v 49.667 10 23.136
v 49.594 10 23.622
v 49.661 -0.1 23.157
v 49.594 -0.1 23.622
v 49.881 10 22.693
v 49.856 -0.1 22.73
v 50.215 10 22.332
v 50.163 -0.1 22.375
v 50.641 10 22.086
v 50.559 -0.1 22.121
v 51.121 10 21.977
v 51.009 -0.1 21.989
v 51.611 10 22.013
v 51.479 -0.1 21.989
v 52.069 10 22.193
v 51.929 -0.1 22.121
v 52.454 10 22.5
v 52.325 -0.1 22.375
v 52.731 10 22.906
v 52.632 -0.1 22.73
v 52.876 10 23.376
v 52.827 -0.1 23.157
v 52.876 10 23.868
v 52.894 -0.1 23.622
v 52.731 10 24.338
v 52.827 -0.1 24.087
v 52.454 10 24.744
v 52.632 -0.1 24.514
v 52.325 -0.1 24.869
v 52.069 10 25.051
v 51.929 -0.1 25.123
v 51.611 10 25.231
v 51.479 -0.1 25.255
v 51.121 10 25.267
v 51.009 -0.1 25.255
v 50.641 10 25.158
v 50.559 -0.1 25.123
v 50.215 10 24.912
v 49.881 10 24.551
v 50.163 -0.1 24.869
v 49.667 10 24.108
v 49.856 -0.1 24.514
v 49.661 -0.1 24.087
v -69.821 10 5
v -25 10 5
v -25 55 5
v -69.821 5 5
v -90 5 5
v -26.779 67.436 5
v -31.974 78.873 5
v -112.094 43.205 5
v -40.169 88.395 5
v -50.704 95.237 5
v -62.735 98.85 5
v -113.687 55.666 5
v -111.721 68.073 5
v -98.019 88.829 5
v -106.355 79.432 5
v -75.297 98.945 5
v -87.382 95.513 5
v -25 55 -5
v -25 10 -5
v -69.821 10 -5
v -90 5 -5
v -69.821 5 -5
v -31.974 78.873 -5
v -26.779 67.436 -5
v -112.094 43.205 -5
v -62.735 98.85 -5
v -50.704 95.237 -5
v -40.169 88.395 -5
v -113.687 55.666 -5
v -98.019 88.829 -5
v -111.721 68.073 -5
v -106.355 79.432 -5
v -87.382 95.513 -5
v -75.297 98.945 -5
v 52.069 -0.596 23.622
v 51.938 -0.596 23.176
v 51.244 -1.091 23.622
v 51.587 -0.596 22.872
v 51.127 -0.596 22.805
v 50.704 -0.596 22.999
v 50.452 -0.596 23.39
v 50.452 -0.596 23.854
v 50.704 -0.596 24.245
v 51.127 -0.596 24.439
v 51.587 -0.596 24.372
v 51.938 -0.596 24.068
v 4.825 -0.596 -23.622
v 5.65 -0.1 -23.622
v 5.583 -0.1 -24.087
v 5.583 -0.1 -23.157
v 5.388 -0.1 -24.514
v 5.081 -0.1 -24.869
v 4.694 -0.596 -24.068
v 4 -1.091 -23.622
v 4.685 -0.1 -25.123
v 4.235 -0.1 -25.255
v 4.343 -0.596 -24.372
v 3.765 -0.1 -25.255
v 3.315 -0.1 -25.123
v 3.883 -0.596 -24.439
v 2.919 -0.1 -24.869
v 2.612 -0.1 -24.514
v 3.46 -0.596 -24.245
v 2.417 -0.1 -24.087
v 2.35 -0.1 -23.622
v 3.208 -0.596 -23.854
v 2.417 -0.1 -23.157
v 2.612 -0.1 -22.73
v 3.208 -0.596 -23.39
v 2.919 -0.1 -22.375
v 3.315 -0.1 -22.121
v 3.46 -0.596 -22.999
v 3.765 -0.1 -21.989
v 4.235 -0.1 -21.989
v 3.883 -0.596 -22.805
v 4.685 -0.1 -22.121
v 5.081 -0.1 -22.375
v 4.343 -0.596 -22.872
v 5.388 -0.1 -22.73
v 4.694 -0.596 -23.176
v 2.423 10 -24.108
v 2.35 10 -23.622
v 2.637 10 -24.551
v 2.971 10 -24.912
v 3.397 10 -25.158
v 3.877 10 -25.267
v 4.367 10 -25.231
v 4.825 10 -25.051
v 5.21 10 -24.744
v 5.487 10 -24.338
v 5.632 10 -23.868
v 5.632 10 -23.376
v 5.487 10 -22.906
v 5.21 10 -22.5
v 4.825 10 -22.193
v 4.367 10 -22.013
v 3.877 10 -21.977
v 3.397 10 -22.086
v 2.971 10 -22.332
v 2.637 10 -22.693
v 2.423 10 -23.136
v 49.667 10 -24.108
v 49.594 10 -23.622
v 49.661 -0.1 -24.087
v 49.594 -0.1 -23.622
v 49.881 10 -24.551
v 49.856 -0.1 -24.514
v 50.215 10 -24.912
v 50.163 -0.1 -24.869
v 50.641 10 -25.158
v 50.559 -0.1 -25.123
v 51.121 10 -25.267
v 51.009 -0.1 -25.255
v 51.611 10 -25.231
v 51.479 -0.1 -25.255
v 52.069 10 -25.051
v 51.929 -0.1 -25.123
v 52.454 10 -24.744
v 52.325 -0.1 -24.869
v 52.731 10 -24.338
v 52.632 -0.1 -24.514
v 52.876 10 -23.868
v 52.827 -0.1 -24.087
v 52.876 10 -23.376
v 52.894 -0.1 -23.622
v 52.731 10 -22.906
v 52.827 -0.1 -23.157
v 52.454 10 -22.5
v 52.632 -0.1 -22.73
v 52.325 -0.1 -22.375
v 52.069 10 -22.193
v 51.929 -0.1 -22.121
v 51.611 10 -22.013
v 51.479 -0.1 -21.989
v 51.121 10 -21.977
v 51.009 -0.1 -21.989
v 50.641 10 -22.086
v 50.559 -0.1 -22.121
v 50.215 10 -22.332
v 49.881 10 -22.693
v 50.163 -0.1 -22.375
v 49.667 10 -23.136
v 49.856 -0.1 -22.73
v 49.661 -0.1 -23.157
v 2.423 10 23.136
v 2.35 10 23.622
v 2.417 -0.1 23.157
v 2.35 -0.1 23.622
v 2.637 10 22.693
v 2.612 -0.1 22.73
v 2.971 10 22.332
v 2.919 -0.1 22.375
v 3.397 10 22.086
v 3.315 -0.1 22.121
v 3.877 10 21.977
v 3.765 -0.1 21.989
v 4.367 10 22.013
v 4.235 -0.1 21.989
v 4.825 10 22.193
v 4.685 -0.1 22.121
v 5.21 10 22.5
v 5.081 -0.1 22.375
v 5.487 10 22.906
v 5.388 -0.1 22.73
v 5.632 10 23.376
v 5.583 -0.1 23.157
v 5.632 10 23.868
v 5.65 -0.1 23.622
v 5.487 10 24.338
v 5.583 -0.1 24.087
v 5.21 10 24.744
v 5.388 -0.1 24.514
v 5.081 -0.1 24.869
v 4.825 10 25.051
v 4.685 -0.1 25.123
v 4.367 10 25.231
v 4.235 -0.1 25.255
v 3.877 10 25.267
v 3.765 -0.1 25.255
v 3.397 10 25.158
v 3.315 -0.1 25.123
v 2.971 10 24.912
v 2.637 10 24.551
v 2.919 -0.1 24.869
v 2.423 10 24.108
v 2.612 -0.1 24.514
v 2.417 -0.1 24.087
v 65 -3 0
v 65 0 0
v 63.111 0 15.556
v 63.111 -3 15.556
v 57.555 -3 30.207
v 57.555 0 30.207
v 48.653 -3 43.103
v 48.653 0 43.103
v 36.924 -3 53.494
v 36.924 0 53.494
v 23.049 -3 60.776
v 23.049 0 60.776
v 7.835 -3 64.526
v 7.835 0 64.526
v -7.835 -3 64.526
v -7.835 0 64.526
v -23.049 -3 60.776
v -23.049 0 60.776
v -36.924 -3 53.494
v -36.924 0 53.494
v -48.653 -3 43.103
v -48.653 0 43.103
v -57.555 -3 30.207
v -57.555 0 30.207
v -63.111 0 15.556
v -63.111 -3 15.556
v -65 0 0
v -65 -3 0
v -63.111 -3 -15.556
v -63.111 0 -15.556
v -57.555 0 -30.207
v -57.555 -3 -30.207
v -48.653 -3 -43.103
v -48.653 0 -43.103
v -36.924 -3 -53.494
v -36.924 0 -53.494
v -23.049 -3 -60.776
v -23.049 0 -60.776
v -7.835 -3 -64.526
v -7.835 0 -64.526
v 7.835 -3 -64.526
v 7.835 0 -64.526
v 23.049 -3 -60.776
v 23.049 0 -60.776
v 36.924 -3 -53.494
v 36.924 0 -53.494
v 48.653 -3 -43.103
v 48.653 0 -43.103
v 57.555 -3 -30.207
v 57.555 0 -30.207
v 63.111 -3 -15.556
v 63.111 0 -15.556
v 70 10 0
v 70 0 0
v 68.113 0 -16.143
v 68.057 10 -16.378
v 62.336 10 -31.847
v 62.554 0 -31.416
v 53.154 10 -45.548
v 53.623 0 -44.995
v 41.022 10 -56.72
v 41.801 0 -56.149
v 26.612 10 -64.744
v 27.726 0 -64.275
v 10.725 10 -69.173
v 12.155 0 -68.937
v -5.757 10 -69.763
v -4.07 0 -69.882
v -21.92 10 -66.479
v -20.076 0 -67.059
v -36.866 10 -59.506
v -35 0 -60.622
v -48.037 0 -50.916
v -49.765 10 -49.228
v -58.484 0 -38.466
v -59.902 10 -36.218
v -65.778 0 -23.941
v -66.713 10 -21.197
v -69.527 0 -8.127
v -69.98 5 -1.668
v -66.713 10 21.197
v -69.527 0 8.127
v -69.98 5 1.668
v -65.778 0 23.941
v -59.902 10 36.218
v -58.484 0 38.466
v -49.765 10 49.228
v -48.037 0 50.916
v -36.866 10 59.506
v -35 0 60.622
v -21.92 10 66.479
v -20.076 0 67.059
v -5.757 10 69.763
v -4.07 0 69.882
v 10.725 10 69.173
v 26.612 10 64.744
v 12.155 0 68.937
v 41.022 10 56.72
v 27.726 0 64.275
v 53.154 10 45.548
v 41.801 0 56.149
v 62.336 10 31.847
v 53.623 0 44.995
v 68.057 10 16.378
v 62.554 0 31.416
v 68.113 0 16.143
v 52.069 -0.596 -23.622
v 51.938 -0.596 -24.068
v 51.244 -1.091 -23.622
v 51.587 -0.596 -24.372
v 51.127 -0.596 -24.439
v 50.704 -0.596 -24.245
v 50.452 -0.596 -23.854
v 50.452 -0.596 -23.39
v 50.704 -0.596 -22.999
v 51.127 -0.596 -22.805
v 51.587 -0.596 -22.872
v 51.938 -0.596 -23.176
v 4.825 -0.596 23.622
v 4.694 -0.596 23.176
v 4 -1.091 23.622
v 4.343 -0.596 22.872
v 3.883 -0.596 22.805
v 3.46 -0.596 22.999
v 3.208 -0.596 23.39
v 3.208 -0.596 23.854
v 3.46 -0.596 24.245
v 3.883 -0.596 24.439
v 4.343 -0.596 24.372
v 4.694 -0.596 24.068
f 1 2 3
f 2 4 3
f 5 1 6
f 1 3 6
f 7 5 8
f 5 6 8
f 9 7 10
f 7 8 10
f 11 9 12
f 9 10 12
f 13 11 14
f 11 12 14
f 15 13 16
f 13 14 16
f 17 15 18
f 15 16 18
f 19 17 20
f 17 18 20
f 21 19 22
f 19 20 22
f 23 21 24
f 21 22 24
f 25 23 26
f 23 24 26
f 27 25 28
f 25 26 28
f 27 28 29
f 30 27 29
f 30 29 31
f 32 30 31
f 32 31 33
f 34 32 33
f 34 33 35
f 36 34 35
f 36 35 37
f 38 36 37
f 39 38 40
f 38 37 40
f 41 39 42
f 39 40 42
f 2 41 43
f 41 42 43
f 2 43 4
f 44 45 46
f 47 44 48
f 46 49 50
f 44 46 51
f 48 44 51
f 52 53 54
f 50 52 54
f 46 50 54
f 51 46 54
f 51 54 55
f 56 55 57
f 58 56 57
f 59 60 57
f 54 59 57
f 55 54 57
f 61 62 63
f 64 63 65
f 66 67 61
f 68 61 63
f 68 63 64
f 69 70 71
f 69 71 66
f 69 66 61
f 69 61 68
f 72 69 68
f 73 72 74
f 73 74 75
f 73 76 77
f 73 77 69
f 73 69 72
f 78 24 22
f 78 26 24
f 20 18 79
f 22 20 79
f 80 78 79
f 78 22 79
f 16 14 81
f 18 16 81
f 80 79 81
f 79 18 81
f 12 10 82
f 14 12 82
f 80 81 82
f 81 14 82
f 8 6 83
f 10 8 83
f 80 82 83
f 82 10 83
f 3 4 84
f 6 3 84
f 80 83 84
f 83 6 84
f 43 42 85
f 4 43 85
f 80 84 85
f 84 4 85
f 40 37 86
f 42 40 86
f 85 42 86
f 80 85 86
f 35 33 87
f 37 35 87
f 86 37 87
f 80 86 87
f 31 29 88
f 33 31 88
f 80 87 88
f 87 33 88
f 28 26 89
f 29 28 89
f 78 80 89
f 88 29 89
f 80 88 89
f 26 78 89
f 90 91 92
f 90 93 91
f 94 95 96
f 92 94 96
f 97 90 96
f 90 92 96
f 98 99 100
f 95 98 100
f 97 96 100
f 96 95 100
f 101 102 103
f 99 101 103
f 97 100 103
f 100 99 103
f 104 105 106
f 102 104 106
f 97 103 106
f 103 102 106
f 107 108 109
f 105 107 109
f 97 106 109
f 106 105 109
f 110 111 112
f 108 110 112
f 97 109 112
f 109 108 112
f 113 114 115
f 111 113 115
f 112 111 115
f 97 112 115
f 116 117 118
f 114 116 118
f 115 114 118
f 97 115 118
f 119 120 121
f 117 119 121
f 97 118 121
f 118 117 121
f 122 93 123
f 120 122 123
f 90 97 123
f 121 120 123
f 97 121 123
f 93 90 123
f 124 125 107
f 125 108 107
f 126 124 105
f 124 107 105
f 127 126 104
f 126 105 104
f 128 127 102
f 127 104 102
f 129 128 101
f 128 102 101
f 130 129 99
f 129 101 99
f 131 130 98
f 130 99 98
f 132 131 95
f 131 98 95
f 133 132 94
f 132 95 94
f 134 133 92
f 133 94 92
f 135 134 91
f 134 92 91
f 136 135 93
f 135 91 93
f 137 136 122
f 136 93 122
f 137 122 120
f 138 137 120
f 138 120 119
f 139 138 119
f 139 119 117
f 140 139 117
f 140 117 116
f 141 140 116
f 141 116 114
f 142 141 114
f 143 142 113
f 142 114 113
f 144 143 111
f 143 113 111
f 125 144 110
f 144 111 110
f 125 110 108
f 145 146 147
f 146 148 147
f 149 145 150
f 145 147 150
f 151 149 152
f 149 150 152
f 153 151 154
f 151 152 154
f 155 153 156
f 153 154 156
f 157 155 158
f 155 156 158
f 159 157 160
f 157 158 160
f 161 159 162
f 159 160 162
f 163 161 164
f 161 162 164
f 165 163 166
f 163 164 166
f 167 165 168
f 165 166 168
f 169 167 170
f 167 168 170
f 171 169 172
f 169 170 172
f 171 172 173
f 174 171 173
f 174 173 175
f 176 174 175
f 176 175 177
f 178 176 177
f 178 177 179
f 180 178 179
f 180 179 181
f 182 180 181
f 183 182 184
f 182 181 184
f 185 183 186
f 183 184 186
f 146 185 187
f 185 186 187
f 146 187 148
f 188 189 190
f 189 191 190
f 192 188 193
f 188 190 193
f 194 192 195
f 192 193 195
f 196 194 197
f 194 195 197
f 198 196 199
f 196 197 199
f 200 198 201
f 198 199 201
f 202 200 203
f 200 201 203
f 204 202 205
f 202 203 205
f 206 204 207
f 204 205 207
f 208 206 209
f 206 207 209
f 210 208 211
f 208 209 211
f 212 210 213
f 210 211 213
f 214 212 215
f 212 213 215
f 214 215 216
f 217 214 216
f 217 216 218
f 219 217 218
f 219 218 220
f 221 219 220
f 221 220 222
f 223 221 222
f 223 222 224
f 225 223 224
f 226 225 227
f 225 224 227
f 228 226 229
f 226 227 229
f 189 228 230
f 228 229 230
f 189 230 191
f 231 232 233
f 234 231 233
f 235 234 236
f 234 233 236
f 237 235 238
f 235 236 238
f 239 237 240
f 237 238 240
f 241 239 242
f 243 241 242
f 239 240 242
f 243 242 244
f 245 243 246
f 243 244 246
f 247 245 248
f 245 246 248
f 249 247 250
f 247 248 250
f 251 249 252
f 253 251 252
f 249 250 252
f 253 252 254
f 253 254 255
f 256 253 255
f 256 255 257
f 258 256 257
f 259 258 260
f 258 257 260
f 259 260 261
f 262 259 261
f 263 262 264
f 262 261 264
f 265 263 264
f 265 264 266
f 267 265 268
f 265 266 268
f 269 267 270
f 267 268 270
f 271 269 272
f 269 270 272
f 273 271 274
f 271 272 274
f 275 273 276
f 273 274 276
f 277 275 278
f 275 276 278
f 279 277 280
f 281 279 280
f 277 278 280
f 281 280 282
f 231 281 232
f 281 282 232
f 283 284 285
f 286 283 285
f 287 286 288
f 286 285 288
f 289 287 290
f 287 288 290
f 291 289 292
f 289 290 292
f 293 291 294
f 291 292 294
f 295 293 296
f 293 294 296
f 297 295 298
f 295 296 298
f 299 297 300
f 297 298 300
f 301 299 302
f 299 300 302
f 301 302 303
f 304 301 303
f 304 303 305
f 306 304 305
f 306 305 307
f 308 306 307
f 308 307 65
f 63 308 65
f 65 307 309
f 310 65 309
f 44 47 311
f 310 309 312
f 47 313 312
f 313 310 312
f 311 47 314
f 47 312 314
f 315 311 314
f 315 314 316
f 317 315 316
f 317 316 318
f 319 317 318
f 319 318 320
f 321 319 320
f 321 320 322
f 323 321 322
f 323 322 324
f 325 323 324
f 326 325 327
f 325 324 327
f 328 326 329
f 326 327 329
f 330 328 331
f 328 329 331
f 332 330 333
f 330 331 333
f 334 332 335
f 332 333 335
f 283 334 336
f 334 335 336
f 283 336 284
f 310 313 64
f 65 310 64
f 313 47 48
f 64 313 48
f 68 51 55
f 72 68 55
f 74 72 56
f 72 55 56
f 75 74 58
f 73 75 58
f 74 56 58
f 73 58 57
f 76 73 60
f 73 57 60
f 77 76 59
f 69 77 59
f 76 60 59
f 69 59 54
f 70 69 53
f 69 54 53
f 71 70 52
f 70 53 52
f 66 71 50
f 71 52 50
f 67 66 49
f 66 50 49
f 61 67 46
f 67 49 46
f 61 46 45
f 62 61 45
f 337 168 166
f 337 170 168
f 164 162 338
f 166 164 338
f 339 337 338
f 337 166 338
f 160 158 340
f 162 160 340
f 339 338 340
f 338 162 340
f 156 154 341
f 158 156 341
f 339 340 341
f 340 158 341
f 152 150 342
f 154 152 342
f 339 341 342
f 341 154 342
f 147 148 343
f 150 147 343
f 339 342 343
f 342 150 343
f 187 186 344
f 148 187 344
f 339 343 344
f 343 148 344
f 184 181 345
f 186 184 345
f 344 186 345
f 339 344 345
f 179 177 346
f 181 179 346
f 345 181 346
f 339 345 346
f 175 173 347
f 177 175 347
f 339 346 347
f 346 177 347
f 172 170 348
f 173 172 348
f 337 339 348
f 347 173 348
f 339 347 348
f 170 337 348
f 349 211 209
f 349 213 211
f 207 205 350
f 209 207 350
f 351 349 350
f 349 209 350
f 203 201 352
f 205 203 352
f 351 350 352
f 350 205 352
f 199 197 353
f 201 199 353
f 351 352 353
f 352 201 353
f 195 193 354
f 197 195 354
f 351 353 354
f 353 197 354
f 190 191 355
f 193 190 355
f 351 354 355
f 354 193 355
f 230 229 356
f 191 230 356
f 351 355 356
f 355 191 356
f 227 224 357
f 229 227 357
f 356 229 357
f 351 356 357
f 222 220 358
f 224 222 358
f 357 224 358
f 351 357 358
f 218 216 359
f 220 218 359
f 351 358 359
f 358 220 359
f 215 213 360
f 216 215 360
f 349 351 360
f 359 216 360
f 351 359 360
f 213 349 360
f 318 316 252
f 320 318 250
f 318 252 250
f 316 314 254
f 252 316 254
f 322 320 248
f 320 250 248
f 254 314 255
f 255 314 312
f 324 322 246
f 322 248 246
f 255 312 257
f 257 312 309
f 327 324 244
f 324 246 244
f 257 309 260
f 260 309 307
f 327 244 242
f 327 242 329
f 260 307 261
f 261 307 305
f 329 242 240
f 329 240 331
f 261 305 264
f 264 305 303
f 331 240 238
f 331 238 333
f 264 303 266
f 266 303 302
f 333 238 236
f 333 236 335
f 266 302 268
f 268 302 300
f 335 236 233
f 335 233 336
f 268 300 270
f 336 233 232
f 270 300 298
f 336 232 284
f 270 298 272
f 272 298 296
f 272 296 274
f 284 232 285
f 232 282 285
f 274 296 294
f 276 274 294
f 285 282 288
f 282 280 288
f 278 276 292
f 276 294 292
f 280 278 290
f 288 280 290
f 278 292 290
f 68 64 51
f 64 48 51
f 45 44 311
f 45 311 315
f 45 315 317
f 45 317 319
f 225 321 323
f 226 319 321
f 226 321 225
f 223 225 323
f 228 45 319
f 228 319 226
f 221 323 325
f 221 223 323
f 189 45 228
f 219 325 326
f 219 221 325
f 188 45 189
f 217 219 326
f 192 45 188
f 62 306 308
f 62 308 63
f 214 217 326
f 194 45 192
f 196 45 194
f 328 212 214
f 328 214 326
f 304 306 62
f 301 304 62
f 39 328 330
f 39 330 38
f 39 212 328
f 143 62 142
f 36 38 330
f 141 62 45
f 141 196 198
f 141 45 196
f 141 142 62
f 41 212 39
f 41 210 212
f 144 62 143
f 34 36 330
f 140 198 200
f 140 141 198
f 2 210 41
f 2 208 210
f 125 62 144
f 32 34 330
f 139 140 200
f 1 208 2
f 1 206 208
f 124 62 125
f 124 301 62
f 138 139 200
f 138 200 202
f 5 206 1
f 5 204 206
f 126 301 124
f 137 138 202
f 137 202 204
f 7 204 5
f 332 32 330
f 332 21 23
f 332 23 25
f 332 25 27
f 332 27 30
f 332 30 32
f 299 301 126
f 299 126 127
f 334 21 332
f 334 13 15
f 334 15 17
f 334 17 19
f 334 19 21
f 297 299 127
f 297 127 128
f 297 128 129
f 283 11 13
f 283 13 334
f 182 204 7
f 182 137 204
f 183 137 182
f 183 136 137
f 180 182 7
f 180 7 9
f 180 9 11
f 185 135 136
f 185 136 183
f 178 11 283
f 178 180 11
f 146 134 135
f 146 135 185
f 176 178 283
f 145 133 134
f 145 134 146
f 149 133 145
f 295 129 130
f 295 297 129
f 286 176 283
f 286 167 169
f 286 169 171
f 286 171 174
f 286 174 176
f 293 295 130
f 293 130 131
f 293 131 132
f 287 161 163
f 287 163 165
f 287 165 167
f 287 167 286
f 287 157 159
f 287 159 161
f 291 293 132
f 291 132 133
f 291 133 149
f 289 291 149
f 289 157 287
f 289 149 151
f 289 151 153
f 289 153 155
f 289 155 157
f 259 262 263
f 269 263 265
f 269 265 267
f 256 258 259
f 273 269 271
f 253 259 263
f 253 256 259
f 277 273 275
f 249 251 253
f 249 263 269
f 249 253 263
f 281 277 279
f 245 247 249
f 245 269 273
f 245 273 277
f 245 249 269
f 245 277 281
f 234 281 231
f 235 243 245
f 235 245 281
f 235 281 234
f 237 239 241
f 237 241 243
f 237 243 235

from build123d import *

# Parameters (mm, degrees)
SKETCH1_R                 = 70
BOSS_EXTRUDE1_DEPTH       = 10
SKETCH2_R                 = 65
BOSS_EXTRUDE2_DEPTH       = 3
BOSS_EXTRUDE3_DEPTH       = 5
M4X0_7_TAPPED_HOLE1_D     = 3.3
M4X0_7_TAPPED_HOLE1_DEPTH = 10.1
M4X0_7_TAPPED_HOLE1_TIP   = 0.991420021


with BuildPart() as part:
    # Sketch1 → Boss-Extrude1 (new body)
    with BuildSketch(Plane(origin=(0, 0, 0), x_dir=(1, 0, 0), z_dir=(0, 1, 0))):
        Circle(SKETCH1_R)
    extrude(amount=BOSS_EXTRUDE1_DEPTH)

    # Sketch2 → Boss-Extrude2 (add)
    with BuildSketch(Plane.XZ):
        Circle(SKETCH2_R)
    extrude(amount=BOSS_EXTRUDE2_DEPTH)

    # Sketch3 → Boss-Extrude3 (add, symmetric)
    with BuildSketch(Plane.XY):
        with BuildLine():
            Line((-25, 55), (-25, 5))
            Line((-25, 5), (-90, 5))
            Line((-90, 5), (-112.094257771, 43.204763027))
            ThreePointArc((-112.094257771, 43.204763027), (-75.29730578, 98.944673602), (-25, 55))
        make_face()
    extrude(amount=BOSS_EXTRUDE3_DEPTH, both=True)

    # M4x0.7 Tapped Hole1
    with Locations(Plane(origin=(0, 10, 0), x_dir=(1, 0, 0), z_dir=(0, 1, 0))):
        with Locations((4, 23.622), (51.244, 23.622), (51.244, -23.622), (4, -23.622)):
            Hole(M4X0_7_TAPPED_HOLE1_D / 2, depth=M4X0_7_TAPPED_HOLE1_DEPTH)
            with Locations((0, 0, -(M4X0_7_TAPPED_HOLE1_DEPTH + M4X0_7_TAPPED_HOLE1_TIP / 2))):  # 118° drill point
                Cone(0, M4X0_7_TAPPED_HOLE1_D / 2, M4X0_7_TAPPED_HOLE1_TIP, mode=Mode.SUBTRACT)


solid = part.part
